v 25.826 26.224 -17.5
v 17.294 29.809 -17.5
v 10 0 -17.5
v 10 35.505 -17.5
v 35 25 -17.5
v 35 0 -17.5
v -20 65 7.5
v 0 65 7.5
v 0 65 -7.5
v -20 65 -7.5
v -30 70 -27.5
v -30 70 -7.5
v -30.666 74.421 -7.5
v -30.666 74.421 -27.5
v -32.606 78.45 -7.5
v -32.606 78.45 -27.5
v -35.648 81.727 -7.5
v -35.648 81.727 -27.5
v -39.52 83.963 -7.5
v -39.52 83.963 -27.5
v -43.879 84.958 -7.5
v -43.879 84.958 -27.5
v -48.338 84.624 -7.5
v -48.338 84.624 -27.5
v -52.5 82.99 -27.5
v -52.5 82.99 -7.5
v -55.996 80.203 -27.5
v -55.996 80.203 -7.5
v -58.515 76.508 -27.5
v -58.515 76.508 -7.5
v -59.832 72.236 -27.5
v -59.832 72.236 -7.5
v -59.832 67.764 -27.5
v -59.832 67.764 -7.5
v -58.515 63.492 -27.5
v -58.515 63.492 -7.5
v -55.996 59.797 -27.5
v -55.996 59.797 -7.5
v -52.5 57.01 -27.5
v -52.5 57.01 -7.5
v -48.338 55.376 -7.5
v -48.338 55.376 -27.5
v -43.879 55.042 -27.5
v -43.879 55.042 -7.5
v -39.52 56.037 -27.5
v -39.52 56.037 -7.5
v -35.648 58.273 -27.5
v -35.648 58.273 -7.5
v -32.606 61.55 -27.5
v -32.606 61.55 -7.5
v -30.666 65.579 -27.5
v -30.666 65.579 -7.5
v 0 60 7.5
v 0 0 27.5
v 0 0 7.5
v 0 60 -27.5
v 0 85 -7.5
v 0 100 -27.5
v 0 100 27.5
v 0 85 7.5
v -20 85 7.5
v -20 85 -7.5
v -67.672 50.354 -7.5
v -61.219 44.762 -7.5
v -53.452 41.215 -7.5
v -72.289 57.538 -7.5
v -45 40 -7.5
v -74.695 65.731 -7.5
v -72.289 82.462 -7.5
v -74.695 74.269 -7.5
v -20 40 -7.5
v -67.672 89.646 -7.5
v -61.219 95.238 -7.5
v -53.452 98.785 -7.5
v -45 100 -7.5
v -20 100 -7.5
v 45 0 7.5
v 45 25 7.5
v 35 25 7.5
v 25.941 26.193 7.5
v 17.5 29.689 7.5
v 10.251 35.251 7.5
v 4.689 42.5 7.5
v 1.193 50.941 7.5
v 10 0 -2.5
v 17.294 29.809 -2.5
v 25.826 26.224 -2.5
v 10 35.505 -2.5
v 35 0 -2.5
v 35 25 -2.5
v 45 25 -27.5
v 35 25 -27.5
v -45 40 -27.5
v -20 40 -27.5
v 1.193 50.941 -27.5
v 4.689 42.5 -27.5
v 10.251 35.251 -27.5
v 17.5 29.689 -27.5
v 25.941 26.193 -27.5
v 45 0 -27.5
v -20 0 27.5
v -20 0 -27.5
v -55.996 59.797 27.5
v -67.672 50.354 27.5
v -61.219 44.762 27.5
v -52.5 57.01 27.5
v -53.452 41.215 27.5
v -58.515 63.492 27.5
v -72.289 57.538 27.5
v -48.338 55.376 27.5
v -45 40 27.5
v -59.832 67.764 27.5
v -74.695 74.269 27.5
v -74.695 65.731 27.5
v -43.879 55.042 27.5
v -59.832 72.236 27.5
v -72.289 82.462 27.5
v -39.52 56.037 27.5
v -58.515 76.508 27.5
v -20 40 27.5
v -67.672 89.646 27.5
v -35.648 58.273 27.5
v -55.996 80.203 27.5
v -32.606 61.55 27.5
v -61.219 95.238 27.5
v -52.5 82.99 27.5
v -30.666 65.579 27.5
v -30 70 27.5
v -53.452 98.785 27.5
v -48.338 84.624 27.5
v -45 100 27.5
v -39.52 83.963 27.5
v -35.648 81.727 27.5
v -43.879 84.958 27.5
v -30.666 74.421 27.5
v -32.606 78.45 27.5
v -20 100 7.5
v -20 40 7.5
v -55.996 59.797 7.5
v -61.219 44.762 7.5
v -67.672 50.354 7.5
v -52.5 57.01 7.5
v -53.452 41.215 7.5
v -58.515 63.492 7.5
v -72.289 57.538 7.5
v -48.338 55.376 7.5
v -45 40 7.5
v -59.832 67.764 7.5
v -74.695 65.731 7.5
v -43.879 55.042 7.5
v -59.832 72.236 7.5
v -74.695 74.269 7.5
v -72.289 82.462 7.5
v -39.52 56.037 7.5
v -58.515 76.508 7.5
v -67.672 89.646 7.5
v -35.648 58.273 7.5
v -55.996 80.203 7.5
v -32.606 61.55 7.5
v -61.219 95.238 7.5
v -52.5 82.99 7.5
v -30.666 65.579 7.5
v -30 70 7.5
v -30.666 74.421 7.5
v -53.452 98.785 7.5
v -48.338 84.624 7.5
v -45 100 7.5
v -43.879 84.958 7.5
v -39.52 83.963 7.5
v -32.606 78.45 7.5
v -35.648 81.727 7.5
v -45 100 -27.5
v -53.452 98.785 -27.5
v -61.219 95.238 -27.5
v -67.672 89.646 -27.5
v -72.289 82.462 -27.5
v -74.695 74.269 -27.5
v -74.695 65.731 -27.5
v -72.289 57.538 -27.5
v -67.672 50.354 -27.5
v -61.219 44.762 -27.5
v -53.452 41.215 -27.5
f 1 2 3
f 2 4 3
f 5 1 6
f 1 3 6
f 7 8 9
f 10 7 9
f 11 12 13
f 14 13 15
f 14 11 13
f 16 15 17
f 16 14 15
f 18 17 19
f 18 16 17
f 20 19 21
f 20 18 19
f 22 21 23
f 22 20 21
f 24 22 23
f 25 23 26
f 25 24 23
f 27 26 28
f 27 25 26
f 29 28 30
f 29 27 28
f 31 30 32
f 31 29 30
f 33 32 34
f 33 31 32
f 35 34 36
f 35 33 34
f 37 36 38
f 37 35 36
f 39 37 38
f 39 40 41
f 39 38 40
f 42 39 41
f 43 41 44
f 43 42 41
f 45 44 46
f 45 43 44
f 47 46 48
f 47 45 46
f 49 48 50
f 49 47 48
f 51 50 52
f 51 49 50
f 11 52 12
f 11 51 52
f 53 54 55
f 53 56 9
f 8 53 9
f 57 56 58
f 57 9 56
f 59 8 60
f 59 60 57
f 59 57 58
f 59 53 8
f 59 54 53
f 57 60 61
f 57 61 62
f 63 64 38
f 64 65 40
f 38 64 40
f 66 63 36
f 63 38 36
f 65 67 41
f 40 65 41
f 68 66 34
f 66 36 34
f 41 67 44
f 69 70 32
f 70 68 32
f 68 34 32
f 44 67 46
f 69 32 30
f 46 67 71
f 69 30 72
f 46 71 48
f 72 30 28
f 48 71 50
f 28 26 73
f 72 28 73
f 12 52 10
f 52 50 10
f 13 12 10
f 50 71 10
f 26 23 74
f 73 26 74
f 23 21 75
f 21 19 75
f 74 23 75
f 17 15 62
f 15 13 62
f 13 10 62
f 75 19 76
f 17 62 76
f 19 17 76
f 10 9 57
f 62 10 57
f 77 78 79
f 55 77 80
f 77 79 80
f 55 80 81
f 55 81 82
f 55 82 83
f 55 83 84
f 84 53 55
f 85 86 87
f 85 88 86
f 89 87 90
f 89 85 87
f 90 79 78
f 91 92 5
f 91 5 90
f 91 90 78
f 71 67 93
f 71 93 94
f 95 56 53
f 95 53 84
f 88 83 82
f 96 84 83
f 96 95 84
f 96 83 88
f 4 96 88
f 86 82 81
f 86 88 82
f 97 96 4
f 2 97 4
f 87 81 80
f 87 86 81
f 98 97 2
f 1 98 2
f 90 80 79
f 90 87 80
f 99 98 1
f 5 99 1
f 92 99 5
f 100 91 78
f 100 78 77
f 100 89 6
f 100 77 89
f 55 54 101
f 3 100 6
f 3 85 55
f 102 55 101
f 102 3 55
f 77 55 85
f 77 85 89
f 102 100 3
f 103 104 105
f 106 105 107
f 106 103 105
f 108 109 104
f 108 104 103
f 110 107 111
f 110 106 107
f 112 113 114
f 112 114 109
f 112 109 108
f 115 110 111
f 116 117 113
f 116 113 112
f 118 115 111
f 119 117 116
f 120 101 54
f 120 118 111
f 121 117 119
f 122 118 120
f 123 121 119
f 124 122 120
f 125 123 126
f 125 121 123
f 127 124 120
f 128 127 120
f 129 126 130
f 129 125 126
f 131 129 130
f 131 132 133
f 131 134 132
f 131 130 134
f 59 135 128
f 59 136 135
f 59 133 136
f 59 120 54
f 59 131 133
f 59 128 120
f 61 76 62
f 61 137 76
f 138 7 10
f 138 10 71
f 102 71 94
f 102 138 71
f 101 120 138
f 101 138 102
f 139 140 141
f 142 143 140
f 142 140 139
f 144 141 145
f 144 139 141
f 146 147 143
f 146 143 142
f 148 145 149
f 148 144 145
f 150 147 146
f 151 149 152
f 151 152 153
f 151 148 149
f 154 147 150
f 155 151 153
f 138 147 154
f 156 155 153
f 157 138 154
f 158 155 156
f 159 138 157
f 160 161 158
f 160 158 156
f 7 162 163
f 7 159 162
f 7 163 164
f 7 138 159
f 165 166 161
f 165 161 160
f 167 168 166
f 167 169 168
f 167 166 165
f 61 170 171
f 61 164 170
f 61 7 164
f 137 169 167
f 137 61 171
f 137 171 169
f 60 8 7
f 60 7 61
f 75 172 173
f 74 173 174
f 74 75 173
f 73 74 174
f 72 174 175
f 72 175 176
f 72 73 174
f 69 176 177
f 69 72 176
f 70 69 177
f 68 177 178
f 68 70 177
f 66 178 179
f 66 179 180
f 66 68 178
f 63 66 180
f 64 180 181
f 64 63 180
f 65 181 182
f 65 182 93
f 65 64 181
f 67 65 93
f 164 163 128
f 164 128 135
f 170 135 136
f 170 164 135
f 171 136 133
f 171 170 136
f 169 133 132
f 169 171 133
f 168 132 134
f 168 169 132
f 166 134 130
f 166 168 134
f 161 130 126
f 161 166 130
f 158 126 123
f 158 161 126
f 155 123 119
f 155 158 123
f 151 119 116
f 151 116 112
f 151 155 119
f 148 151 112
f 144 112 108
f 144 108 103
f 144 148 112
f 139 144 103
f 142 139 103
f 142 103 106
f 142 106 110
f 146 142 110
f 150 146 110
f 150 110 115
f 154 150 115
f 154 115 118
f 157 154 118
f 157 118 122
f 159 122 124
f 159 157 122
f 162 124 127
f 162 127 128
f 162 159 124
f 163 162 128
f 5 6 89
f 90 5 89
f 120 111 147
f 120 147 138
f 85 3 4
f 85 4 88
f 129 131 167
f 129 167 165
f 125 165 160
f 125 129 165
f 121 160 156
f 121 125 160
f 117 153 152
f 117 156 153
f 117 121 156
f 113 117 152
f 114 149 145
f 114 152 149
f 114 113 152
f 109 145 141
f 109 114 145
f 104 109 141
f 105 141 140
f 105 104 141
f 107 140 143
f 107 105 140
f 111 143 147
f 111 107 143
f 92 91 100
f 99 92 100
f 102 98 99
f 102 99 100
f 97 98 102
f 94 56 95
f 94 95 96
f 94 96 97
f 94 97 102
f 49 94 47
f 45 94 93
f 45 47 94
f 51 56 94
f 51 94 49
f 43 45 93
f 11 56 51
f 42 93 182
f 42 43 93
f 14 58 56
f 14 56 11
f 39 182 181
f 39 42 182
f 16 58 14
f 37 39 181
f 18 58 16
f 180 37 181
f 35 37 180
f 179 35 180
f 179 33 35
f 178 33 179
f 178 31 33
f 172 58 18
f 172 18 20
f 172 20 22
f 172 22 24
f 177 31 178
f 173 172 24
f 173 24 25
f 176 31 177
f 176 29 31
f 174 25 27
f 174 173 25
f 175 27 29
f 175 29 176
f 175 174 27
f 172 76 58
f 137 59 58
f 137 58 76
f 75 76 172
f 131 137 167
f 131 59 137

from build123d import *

# Parameters (mm, degrees)
SKETCH1_R           = 15
BOSS_EXTRUDE1_DEPTH = 27.5
CUT_EXTRUDE1_REACH  = 129.989
SKETCH2_W           = 55
SKETCH2_H           = 15
BOSS_EXTRUDE2_DEPTH = 35
CUT_EXTRUDE2_REACH  = 129.989
SKETCH5_W           = 15
SKETCH5_H           = 20
CUT_EXTRUDE3_REACH  = 129.989
SKETCH6_W           = 25
SKETCH6_H           = 15


with BuildPart() as part:
    # Sketch1 → Boss-Extrude1 (new, symmetric)
    with BuildSketch(Plane.XY):
        with BuildLine():
            Line((0, 0), (0, 100))
            Line((0, 100), (-45, 100))
            ThreePointArc((-45, 100), (-75, 70), (-45, 40))
            Line((-45, 40), (-20, 40))
            Line((-20, 40), (-20, 0))
            Line((-20, 0), (0, 0))
        make_face()
        with Locations((-45, 70)):
            Circle(SKETCH1_R, mode=Mode.SUBTRACT)
    extrude(amount=BOSS_EXTRUDE1_DEPTH, both=True)

    # Sketch2 → Cut-Extrude1 (cut, up to next)
    with BuildSketch(Plane(origin=(0, 100, 0), x_dir=(1, 0, 0), z_dir=(0, 1, 0)), mode=Mode.PRIVATE) as cut_extrude1_sk1:
        with Locations((-47.5, 0)):
            Rectangle(SKETCH2_W, SKETCH2_H)
    cut_extrude1_tool1 = extrude(cut_extrude1_sk1.sketch, amount=-CUT_EXTRUDE1_REACH, mode=Mode.PRIVATE) & part.part
    add(cut_extrude1_tool1.solids().sort_by_distance((-47.5, 100, 0))[0], mode=Mode.SUBTRACT)

    # Sketch4 → Boss-Extrude2 (add)
    with BuildSketch(Plane(origin=(0, 0, -27.5), x_dir=(-1, 0, 0), z_dir=(0, 0, -1))):
        with BuildLine():
            Line((-45, 0), (0, 0))
            Line((0, 0), (0, 60))
            ThreePointArc((0, 60), (-10.251262658, 35.251262658), (-35, 25))
            Line((-35, 25), (-45, 25))
            Line((-45, 25), (-45, 0))
        make_face()
    extrude(amount=-BOSS_EXTRUDE2_DEPTH)

    # Sketch5 → Cut-Extrude2 (cut, up to next)
    with BuildSketch(Plane(origin=(0, 0, 0), x_dir=(0, 0, -1), z_dir=(1, 0, 0)), mode=Mode.PRIVATE) as cut_extrude2_sk1:
        with Locations((0, 75)):
            Rectangle(SKETCH5_W, SKETCH5_H)
    cut_extrude2_tool1 = extrude(cut_extrude2_sk1.sketch, amount=-CUT_EXTRUDE2_REACH, mode=Mode.PRIVATE) & part.part
    add(cut_extrude2_tool1.solids().sort_by_distance((0, 75, 0))[0], mode=Mode.SUBTRACT)

    # Sketch6 → Cut-Extrude3 (cut, up to next)
    with BuildSketch(Plane.XZ, mode=Mode.PRIVATE) as cut_extrude3_sk1:
        with Locations((22.5, -10)):
            Rectangle(SKETCH6_W, SKETCH6_H)
    cut_extrude3_tool1 = extrude(cut_extrude3_sk1.sketch, amount=-CUT_EXTRUDE3_REACH, mode=Mode.PRIVATE) & part.part
    add(cut_extrude3_tool1.solids().sort_by_distance((22.5, 0, -10))[0], mode=Mode.SUBTRACT)


solid = part.part
